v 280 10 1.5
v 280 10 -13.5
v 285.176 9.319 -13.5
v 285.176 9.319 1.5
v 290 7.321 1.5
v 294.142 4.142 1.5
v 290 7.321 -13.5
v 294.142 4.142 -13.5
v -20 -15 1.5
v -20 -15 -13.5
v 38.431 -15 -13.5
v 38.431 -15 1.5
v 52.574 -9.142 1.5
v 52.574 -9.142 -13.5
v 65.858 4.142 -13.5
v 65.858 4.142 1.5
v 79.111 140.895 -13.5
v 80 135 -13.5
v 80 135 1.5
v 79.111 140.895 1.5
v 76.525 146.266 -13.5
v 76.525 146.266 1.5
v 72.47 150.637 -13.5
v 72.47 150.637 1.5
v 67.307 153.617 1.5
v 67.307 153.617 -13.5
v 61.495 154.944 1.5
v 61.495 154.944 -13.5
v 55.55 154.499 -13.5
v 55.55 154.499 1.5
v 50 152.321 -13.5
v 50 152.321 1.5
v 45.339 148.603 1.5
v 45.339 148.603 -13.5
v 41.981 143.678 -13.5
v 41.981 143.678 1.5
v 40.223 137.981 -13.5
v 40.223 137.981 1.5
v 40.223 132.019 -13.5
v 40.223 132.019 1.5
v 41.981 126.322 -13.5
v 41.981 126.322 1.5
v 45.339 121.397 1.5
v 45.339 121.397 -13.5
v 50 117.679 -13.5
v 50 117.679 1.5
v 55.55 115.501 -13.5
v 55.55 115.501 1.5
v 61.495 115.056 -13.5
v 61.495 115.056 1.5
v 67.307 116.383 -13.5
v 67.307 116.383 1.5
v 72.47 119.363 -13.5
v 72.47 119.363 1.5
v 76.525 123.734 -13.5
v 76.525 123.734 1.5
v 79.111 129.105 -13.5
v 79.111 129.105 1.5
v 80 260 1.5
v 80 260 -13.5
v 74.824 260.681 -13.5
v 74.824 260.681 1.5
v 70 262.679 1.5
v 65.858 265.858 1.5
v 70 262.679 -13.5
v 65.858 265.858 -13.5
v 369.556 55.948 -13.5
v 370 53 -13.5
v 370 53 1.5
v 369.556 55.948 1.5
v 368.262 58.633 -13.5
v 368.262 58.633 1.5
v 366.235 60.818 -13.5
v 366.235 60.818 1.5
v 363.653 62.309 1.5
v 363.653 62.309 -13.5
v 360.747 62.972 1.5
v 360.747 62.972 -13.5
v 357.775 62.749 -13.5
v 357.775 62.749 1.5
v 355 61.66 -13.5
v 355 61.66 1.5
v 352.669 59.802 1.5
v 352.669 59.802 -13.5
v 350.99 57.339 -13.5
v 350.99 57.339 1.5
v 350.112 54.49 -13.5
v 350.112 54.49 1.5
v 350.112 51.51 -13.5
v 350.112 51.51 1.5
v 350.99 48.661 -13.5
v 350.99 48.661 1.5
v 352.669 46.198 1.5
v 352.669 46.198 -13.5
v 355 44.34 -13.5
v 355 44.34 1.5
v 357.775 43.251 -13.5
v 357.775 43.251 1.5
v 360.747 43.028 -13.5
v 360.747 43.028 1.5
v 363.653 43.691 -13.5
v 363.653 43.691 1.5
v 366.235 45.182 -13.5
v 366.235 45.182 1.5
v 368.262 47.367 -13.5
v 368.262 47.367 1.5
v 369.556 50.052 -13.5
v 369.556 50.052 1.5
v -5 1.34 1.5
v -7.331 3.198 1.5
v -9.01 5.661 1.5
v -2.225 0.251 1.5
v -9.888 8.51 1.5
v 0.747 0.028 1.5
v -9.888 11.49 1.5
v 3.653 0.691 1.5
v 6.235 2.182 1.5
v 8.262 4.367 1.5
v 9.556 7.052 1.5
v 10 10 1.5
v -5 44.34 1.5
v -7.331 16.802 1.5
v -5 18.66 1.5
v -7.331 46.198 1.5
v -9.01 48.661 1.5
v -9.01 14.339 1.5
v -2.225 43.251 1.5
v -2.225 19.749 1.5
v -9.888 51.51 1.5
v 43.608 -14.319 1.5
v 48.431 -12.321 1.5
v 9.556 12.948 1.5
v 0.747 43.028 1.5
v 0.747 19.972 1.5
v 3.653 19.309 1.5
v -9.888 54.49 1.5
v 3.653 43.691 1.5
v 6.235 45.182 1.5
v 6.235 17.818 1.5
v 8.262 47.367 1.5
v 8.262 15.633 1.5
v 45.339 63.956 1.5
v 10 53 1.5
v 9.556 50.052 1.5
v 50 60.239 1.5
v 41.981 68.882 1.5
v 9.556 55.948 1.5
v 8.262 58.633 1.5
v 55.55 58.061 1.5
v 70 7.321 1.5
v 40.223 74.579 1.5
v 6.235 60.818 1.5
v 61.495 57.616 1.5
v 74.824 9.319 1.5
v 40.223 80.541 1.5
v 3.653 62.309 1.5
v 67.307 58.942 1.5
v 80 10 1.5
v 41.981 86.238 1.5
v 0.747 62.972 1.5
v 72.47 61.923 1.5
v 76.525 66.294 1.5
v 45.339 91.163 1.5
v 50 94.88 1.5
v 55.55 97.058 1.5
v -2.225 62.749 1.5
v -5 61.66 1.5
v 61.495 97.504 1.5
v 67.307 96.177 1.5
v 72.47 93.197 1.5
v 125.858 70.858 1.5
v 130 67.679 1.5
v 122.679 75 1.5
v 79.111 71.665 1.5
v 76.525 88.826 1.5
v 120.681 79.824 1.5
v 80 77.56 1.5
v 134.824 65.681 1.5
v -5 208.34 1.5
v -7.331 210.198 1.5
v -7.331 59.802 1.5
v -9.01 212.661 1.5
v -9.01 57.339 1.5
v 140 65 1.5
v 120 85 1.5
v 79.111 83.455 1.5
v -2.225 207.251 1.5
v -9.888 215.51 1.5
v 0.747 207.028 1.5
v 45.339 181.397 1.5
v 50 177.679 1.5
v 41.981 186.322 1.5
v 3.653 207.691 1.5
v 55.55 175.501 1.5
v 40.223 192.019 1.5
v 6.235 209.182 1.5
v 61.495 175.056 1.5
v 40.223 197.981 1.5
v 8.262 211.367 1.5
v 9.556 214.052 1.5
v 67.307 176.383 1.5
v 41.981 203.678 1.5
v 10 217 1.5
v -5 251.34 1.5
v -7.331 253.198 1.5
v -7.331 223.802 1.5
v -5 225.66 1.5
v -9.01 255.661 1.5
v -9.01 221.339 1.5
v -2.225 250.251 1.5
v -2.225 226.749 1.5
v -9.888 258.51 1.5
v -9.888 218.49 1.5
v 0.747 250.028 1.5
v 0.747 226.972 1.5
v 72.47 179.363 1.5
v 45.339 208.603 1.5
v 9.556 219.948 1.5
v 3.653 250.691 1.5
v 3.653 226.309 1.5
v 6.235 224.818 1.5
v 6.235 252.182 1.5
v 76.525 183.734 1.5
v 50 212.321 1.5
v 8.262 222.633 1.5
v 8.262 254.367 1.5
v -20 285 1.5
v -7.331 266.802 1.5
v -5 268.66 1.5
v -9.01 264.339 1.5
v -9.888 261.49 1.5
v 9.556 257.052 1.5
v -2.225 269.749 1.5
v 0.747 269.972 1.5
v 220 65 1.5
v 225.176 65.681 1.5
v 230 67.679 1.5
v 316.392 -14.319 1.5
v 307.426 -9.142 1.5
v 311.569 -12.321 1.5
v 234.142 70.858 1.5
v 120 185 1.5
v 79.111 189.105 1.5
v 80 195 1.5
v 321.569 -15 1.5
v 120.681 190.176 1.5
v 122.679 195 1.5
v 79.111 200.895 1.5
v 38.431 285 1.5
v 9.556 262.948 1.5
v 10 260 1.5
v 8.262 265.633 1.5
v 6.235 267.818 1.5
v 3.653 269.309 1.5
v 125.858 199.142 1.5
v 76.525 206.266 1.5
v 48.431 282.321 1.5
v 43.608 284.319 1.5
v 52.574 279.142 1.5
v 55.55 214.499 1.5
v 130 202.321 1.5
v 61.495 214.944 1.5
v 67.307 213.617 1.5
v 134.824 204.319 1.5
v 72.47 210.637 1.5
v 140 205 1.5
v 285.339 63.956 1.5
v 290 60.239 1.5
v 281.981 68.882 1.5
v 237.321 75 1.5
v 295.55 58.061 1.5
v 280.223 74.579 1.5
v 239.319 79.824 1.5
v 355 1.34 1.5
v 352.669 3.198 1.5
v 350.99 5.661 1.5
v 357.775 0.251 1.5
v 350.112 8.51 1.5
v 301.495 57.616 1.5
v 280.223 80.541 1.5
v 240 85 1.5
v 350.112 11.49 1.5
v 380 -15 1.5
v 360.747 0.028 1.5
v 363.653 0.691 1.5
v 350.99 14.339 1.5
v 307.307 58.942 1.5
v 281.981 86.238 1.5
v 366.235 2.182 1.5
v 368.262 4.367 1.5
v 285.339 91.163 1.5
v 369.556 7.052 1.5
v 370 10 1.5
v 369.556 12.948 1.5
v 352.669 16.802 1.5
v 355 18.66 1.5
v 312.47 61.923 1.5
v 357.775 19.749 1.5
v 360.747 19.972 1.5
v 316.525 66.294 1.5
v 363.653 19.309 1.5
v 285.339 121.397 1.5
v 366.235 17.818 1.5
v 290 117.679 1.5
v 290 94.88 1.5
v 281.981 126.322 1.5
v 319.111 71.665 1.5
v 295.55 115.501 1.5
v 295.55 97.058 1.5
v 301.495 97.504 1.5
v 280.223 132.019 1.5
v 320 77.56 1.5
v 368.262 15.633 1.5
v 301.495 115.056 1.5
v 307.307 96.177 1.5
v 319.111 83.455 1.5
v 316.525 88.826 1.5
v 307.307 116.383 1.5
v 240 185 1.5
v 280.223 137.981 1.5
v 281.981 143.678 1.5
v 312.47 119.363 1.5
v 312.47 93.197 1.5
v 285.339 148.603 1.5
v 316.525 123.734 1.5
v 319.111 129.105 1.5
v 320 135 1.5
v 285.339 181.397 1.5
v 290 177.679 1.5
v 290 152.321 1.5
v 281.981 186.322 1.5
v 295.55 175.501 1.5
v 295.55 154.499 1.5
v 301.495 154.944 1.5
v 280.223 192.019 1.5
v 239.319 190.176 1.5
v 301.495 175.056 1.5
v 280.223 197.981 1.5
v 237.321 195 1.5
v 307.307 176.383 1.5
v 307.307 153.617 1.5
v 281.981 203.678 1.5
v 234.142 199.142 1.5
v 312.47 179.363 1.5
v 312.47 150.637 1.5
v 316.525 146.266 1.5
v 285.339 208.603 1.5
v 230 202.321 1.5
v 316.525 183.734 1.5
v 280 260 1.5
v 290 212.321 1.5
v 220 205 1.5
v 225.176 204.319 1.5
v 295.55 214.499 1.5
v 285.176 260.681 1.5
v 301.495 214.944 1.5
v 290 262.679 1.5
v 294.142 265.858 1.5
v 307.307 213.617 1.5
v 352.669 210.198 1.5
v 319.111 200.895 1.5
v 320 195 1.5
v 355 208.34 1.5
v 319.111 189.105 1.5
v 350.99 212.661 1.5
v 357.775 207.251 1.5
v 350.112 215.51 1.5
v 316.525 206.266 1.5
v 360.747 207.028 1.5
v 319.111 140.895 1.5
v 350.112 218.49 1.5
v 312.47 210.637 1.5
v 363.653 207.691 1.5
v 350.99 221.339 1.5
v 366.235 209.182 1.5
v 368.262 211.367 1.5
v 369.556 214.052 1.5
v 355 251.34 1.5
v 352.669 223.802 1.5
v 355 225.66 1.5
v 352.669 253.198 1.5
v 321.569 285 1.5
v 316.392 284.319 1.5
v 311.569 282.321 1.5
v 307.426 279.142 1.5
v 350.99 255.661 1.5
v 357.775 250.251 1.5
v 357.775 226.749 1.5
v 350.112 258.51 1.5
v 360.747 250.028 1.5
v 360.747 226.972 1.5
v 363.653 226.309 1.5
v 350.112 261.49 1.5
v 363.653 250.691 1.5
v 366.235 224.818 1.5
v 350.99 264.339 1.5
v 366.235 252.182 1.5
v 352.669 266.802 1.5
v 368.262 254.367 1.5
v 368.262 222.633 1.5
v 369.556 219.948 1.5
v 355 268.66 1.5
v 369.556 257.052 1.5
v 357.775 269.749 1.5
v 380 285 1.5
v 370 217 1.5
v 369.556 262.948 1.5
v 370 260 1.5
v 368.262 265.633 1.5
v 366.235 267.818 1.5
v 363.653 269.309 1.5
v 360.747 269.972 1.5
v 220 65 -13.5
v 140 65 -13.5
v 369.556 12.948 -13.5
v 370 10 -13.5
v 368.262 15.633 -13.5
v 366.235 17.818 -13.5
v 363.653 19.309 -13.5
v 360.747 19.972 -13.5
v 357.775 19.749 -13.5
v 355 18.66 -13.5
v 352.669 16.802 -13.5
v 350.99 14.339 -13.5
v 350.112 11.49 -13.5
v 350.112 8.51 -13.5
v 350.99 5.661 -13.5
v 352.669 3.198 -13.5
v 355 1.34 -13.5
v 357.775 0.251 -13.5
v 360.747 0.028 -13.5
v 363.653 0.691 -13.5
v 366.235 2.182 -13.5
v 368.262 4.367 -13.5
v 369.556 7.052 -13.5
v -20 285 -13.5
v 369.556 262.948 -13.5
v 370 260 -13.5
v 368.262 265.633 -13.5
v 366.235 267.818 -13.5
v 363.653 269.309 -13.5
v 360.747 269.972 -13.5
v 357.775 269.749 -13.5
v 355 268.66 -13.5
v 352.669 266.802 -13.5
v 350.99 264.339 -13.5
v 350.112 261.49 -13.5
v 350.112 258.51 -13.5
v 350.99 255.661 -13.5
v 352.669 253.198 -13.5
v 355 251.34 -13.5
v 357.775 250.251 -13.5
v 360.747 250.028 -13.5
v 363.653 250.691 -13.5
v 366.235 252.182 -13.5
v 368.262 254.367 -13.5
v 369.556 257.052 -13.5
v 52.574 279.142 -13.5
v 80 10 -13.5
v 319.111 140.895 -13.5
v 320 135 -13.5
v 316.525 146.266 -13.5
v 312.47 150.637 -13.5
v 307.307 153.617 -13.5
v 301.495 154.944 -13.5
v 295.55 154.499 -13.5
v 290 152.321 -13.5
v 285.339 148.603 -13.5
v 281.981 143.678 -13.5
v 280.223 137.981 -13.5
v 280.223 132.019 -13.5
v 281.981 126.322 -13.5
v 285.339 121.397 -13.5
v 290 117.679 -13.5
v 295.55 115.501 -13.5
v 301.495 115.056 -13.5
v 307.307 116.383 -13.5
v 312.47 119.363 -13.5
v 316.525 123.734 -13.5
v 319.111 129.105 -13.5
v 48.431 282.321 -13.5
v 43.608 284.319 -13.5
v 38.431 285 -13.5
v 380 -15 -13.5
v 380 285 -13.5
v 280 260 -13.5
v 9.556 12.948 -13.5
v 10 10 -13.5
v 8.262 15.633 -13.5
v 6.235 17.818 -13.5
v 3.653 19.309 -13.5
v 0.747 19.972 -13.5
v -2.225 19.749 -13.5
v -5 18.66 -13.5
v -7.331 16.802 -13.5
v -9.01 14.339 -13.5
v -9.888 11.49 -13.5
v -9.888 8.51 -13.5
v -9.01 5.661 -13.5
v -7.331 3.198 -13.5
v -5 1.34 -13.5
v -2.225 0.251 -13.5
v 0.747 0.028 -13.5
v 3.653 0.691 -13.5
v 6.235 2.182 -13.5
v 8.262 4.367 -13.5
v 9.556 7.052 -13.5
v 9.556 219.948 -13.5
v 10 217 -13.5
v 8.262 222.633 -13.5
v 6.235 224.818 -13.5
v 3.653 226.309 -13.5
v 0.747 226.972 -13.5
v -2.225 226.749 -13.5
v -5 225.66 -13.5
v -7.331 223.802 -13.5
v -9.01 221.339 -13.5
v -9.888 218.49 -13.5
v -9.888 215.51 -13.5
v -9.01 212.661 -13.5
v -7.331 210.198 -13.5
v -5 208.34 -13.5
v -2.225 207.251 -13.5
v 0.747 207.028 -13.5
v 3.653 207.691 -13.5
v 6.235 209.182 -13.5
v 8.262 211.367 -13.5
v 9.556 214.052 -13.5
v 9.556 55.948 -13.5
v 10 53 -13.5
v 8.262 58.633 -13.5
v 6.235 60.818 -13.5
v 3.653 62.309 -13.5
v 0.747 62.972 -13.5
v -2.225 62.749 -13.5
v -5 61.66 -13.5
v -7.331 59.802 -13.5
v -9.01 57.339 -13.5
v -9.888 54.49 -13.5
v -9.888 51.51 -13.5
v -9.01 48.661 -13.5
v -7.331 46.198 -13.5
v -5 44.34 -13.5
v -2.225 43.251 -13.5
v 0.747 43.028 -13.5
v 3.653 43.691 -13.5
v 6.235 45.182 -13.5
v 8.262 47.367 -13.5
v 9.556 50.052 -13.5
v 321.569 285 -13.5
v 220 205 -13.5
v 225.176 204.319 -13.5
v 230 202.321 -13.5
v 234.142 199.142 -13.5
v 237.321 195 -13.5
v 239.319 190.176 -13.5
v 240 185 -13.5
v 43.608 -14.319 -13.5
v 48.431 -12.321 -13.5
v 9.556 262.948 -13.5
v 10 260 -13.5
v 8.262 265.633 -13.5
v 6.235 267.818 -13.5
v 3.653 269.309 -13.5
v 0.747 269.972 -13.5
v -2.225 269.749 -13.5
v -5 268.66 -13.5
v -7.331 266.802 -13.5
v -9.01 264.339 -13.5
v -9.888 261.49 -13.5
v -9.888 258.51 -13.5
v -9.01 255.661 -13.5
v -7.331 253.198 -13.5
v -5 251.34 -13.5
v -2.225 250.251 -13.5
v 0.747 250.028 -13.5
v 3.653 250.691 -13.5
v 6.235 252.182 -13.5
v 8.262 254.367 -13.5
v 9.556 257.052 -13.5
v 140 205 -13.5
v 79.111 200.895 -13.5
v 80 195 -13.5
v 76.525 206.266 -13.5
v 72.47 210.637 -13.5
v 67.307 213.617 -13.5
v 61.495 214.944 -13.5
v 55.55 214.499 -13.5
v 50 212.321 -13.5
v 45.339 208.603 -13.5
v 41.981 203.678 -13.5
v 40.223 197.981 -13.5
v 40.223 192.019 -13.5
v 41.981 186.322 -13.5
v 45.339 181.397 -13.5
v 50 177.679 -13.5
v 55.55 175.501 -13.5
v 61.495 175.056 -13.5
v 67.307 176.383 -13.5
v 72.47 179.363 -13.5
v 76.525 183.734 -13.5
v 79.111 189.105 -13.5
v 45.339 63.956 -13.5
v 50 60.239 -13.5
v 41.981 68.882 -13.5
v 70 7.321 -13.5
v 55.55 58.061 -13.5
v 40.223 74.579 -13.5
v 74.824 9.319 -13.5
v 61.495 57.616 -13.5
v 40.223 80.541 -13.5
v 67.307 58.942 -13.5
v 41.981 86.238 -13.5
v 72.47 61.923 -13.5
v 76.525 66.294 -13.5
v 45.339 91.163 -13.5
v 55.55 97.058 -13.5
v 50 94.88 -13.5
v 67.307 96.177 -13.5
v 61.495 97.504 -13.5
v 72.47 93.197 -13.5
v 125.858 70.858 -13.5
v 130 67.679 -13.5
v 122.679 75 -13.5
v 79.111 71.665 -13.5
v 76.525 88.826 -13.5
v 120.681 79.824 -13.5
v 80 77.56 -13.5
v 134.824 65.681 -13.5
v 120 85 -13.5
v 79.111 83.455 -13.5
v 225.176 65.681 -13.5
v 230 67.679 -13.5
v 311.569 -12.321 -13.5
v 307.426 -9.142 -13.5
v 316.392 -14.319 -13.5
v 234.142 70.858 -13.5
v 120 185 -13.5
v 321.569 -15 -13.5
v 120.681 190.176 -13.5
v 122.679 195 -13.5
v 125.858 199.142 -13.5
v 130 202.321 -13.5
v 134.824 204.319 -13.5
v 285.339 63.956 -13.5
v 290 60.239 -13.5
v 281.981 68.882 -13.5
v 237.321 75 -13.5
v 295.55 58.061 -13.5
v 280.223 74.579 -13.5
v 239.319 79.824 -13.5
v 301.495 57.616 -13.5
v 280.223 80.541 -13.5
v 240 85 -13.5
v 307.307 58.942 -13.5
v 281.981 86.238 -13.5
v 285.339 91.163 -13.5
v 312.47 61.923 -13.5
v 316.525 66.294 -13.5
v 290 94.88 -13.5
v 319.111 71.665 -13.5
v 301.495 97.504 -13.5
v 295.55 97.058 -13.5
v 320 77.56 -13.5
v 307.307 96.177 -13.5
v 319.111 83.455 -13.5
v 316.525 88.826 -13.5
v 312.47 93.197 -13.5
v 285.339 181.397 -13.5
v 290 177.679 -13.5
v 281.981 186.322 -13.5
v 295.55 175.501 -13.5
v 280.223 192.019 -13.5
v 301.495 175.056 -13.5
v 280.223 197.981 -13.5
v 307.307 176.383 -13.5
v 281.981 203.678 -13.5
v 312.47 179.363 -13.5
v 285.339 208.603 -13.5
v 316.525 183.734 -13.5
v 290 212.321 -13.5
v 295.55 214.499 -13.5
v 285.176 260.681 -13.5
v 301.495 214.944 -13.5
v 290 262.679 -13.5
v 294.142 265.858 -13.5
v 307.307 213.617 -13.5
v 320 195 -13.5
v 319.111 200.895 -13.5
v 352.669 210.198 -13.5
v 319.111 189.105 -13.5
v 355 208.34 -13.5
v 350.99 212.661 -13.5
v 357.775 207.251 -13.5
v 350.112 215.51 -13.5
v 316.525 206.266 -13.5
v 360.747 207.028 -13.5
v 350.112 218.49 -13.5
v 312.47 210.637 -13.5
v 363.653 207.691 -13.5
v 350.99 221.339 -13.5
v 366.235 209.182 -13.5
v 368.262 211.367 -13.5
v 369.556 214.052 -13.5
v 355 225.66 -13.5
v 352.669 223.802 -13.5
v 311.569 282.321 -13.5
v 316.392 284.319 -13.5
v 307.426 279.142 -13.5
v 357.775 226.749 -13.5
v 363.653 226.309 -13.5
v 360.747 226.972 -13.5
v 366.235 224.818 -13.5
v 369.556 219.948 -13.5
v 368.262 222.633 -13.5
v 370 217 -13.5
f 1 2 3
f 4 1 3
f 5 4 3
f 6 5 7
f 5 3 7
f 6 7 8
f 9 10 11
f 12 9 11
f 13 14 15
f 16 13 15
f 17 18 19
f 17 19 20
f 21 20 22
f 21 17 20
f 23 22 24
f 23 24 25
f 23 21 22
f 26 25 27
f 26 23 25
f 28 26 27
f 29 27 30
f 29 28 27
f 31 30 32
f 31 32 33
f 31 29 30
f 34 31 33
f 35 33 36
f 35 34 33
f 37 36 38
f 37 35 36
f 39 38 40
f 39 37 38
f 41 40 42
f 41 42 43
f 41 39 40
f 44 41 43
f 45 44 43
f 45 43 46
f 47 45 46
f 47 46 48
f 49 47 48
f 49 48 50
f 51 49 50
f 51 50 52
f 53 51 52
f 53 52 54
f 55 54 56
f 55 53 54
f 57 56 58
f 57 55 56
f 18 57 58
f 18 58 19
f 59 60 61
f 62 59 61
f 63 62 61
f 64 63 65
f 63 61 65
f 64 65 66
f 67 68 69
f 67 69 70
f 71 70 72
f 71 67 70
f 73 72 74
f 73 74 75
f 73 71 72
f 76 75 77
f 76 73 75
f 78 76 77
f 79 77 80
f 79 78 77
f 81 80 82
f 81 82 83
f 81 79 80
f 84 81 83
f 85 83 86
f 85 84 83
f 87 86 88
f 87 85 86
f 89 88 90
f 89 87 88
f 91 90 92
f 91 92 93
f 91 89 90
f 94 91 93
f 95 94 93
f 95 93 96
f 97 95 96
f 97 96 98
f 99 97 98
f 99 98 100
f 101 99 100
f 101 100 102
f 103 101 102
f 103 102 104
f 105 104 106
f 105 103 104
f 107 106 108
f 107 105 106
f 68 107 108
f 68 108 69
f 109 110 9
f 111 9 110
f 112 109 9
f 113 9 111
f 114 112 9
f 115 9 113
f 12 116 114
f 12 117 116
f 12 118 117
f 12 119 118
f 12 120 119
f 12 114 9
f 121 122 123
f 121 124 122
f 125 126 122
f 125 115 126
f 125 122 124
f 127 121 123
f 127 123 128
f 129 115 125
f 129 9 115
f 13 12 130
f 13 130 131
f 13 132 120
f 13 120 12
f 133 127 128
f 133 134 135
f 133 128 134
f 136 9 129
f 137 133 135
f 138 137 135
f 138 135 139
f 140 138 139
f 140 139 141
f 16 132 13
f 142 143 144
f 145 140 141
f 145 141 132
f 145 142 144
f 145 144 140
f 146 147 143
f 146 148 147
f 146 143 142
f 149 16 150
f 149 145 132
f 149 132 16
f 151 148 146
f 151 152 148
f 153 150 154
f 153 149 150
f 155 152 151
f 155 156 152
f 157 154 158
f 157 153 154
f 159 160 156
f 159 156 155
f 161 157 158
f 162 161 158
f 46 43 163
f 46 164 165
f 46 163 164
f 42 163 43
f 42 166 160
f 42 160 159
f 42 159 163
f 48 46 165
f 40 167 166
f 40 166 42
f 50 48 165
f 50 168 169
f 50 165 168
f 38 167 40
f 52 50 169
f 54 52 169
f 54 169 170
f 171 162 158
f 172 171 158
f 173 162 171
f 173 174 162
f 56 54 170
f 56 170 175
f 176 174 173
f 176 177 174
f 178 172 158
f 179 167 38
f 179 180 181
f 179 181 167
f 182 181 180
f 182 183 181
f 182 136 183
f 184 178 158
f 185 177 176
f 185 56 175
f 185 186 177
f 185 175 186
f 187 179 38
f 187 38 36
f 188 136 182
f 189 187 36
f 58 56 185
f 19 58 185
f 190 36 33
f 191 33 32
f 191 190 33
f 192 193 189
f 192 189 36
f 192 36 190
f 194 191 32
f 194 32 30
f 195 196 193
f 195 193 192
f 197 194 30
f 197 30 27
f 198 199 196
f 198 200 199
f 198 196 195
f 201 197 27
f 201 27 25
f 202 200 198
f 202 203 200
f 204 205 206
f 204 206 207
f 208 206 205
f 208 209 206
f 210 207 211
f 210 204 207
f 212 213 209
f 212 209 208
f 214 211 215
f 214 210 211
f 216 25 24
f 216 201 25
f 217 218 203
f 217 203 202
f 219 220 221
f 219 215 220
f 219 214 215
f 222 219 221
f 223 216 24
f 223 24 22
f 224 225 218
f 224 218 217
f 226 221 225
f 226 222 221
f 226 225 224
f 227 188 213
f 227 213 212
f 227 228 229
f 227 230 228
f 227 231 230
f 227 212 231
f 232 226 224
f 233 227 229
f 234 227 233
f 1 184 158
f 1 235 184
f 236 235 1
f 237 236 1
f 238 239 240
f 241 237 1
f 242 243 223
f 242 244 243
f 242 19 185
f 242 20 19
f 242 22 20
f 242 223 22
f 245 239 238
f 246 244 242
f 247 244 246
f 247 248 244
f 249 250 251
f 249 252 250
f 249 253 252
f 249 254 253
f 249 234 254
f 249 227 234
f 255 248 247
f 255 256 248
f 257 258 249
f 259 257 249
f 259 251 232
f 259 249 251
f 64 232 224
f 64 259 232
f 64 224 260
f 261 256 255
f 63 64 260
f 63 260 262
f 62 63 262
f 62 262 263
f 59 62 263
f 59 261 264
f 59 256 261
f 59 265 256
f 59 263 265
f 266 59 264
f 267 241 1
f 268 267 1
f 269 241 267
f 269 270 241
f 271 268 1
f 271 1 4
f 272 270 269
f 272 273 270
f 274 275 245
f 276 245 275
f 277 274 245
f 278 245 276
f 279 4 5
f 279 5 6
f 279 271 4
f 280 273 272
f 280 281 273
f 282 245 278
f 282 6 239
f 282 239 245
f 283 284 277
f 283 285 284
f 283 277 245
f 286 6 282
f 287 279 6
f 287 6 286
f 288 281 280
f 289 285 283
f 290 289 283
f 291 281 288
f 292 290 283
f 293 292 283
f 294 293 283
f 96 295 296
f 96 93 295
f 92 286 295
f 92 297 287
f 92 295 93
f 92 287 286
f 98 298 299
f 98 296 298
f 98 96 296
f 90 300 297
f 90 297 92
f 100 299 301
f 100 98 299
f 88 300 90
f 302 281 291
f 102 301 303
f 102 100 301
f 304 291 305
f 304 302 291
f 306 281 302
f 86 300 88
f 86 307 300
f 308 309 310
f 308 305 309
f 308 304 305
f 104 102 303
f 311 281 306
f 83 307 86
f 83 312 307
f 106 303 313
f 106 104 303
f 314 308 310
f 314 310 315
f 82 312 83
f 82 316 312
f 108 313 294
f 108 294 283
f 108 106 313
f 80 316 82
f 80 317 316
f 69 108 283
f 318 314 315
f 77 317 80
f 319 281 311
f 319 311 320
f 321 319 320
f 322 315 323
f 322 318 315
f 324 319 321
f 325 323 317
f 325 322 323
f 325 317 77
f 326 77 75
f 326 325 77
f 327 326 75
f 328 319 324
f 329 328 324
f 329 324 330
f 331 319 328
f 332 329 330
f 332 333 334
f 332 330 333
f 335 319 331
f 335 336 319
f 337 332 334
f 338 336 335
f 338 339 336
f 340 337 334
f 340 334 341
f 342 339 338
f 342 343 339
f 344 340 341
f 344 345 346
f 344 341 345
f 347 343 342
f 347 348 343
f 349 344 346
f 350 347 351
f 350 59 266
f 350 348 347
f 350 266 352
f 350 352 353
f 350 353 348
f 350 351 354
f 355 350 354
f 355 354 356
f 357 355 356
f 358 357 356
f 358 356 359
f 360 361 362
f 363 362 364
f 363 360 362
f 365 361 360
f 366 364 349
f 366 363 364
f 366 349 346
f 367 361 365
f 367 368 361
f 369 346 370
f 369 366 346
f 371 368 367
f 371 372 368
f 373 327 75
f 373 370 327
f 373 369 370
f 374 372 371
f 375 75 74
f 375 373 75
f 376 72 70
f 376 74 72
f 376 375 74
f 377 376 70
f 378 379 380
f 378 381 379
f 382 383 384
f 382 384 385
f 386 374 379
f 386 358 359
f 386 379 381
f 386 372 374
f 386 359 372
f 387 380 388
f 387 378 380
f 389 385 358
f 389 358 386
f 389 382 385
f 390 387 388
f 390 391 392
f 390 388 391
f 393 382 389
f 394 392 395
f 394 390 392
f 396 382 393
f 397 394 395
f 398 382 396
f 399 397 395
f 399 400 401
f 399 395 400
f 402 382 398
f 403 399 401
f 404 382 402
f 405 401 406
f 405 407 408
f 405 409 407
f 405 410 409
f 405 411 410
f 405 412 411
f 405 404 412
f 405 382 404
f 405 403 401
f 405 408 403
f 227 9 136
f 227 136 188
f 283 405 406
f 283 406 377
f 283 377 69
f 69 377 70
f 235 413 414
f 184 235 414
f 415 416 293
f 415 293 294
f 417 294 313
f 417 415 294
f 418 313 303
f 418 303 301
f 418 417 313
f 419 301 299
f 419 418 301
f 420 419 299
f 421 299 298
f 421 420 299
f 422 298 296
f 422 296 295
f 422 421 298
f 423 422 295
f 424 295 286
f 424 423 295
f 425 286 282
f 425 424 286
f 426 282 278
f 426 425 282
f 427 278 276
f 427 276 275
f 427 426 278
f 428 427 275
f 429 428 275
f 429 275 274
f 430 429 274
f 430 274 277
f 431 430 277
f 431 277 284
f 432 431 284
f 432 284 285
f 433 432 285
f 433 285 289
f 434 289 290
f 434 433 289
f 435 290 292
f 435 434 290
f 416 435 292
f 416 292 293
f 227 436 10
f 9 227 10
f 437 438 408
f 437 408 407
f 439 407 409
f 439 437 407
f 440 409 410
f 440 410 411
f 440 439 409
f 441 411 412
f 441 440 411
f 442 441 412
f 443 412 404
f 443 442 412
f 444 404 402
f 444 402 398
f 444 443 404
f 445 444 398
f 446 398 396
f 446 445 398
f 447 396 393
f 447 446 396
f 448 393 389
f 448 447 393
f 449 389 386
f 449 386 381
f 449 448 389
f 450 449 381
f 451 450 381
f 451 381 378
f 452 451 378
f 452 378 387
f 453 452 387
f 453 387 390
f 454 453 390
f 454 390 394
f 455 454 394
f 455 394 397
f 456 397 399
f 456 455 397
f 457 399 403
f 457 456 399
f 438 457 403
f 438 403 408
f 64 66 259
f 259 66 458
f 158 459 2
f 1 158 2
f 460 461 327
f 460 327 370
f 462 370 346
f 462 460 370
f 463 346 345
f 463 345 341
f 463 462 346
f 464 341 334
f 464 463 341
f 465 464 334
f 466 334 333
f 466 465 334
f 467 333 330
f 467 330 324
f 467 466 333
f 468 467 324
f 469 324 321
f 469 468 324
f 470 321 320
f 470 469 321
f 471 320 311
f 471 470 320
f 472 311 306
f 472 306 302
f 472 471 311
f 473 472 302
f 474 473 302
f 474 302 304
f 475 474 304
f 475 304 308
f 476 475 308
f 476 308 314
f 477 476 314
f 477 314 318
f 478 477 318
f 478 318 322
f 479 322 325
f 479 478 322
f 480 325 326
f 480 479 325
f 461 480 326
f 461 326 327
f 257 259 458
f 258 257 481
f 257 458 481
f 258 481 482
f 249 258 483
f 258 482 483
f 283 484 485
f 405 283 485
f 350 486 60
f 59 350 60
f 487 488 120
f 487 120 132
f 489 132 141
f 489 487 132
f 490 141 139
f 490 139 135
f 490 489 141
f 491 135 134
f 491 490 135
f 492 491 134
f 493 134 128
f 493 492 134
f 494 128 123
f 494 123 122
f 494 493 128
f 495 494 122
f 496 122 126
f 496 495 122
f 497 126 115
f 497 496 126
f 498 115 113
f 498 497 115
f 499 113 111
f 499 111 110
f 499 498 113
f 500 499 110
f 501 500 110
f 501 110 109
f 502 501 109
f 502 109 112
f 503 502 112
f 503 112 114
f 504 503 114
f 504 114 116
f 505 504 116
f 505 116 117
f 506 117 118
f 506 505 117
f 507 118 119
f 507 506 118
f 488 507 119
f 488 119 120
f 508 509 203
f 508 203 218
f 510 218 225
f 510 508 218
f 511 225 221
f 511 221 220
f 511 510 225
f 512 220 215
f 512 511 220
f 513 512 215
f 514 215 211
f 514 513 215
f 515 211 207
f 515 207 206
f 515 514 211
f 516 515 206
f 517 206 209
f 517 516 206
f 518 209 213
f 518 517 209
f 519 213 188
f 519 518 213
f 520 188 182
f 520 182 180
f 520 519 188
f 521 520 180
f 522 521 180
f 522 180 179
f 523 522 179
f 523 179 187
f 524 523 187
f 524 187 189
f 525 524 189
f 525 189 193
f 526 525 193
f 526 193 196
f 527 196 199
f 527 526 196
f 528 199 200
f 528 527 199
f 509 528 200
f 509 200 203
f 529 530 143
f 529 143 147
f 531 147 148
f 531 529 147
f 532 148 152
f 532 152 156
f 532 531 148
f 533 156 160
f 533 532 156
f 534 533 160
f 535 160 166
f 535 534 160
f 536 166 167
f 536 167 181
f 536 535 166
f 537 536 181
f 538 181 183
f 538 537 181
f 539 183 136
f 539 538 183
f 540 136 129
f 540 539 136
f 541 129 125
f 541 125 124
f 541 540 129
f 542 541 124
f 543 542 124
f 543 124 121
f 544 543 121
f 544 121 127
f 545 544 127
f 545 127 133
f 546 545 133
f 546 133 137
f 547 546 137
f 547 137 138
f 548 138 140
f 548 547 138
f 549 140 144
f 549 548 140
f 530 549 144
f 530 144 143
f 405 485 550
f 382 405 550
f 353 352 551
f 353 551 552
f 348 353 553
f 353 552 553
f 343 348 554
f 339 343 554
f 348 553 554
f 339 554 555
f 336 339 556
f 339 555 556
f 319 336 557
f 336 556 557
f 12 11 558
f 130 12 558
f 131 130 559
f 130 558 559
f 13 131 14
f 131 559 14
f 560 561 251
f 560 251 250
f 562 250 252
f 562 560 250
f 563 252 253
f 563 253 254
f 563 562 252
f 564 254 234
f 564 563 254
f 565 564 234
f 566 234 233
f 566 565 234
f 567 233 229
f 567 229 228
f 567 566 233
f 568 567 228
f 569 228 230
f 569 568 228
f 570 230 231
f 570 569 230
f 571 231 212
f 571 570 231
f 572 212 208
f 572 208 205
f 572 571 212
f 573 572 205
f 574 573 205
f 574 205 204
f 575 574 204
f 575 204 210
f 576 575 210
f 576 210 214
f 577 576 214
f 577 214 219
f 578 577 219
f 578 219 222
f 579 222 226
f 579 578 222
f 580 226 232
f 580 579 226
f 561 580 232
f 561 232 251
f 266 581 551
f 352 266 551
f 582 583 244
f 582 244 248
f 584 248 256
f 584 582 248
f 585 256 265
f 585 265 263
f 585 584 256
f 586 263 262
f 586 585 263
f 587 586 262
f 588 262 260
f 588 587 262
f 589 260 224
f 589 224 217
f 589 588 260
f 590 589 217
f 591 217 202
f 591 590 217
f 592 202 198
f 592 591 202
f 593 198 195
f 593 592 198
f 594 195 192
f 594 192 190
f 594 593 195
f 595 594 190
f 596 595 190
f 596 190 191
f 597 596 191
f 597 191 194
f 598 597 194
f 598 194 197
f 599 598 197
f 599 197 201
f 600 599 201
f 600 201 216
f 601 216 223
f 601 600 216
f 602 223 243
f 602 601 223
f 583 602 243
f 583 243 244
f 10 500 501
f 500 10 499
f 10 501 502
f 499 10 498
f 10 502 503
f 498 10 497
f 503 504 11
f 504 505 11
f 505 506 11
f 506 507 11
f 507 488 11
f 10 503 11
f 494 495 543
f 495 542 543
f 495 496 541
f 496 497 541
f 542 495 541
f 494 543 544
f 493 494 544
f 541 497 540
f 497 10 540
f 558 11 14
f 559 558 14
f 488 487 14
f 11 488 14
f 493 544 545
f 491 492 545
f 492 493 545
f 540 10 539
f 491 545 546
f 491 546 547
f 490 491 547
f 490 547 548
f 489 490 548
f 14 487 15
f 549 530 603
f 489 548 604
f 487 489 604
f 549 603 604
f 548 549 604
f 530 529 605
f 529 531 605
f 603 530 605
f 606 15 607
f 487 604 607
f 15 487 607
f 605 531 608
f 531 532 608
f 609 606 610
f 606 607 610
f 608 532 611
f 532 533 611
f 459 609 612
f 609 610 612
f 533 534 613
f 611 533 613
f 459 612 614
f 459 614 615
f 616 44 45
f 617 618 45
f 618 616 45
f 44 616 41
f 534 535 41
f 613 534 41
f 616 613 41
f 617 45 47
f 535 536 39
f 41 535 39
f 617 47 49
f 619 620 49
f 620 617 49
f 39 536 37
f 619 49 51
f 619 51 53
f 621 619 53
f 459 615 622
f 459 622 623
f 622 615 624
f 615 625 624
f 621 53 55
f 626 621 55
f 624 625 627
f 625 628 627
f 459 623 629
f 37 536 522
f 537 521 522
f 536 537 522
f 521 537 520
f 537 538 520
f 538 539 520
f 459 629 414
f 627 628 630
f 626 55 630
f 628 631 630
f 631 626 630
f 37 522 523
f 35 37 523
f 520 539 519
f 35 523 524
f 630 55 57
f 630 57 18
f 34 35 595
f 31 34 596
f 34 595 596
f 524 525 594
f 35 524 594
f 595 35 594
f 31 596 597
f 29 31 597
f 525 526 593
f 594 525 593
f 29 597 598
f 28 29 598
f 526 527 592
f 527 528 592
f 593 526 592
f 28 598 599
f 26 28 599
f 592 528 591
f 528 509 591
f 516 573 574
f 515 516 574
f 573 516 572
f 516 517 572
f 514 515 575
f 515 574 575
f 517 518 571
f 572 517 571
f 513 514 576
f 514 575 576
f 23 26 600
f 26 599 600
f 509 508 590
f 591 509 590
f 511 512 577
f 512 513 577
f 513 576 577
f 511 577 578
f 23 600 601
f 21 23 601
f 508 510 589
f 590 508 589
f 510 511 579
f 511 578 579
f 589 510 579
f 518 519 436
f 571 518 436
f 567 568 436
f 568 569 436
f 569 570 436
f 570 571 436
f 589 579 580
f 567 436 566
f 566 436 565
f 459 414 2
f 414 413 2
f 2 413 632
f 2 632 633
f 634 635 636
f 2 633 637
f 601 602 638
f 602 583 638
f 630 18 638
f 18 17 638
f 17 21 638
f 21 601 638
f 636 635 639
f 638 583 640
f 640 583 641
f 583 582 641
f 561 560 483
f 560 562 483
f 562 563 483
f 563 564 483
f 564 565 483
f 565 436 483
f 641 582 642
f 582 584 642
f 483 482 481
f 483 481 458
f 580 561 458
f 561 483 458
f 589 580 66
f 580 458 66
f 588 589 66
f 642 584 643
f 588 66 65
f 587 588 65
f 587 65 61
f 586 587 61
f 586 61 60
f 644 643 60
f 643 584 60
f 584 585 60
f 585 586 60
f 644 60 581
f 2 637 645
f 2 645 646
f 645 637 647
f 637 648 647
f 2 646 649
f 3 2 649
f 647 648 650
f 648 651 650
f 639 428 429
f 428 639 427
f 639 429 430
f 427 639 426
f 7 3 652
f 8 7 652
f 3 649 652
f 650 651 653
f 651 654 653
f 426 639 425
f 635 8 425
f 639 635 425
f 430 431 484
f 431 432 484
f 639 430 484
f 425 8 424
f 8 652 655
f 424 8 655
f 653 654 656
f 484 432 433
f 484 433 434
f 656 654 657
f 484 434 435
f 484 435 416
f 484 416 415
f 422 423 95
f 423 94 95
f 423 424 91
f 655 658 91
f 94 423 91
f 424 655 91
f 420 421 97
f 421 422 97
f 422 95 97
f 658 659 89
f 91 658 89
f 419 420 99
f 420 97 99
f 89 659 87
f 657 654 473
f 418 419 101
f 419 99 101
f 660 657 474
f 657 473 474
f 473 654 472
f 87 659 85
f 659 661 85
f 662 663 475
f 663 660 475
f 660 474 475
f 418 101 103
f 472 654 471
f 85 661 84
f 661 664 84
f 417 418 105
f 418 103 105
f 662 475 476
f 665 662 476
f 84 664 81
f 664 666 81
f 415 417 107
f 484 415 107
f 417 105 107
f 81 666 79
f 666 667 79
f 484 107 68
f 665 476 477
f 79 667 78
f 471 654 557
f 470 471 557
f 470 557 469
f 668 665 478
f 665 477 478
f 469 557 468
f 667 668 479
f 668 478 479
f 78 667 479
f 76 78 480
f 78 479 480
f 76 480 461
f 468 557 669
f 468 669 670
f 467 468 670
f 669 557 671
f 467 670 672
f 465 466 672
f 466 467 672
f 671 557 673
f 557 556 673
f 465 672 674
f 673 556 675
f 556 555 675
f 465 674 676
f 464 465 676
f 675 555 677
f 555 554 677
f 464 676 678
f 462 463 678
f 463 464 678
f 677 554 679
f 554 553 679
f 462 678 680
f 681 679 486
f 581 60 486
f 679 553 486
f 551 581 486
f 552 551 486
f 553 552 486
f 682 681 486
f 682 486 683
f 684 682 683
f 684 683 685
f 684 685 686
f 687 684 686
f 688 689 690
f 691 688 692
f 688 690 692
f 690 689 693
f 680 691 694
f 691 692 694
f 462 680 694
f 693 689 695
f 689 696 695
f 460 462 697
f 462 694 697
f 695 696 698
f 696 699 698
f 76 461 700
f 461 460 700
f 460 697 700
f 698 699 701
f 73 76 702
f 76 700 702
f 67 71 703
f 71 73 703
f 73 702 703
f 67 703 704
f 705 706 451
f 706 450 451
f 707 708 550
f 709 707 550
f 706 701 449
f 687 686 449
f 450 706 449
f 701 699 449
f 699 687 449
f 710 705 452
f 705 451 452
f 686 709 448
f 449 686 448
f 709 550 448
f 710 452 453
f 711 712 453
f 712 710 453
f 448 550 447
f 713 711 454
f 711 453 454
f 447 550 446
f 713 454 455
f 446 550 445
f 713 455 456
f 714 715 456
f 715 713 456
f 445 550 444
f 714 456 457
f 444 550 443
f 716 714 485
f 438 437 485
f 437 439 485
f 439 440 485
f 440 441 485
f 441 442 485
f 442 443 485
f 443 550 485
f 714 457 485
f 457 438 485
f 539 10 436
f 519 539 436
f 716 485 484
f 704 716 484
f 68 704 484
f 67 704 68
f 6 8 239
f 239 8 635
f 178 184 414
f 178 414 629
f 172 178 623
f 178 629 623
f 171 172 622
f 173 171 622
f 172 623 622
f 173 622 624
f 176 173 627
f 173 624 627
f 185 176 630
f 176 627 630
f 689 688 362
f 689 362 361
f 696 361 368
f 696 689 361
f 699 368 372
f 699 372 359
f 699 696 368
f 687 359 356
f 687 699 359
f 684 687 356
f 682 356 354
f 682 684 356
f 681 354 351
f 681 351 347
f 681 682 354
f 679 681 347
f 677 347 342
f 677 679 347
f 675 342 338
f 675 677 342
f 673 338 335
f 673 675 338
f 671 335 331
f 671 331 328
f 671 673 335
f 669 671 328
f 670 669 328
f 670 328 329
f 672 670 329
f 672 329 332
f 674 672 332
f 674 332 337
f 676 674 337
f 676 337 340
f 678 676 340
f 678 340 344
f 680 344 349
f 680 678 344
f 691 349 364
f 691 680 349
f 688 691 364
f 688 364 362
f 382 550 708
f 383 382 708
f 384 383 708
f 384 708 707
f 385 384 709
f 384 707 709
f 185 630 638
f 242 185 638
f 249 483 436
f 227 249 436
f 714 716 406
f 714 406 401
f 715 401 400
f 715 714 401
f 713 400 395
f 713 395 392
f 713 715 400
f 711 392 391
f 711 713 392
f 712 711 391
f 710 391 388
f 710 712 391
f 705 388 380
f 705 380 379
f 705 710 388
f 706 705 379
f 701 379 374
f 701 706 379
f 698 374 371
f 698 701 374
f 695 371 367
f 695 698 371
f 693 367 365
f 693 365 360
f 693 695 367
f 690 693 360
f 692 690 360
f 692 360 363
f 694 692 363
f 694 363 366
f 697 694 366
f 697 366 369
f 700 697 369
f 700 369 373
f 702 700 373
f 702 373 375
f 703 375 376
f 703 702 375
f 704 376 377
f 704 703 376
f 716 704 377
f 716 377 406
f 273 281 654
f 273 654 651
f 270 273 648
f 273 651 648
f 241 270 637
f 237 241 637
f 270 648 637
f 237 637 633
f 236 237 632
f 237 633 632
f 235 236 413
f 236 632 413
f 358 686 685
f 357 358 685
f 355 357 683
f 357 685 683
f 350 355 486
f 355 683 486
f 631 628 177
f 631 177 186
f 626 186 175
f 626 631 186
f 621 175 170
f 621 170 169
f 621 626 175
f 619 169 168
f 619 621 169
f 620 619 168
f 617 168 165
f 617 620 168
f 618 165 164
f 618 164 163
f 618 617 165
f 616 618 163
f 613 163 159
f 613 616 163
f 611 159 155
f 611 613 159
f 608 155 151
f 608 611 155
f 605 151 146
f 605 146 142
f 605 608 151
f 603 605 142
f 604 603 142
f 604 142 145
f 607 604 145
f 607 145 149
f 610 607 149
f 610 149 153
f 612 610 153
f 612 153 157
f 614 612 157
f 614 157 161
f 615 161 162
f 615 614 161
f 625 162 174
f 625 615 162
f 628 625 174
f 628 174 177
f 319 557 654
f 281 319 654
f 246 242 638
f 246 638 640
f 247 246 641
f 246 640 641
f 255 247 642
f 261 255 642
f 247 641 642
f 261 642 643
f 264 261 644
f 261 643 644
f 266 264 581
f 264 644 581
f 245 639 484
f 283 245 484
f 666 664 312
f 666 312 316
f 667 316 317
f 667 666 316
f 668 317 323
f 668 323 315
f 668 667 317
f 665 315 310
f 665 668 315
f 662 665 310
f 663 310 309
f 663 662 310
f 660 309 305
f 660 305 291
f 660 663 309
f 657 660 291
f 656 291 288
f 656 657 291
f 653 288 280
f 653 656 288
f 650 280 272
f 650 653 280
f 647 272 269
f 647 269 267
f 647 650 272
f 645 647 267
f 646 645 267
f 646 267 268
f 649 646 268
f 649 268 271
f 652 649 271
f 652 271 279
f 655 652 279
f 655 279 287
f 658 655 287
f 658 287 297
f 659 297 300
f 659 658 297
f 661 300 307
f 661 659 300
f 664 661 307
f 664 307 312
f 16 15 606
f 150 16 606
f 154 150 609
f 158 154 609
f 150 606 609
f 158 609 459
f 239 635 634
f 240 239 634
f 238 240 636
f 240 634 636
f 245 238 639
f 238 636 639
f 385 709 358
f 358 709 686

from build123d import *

# Parameters (mm, degrees)
F0_R     = 1
F0_R_2   = 2
F1_DEPTH = 1.5
F2_SCALE = 10


# Not quite as in the source:
# - ends of sketch curves that miss each other by under 0.0002 mm in the source are joined


with BuildPart() as f1:
    # F0 (on Top) → F1 (new body)
    with BuildSketch(Plane.XY):
        with BuildLine():
            ThreePointArc((14.156854, 15), (13.3914871353, 14.847759065), (12.7426404376, 14.4142135624))
            Line((12.7426404376, 14.4142135624), (11.414213, 13.085786))
            ThreePointArc((11.414213, 13.085786), (10.7653665381, 12.6522407997), (10, 12.5))
            Line((10, 12.5), (-10, 12.5))
            ThreePointArc((-10, 12.5), (-10.7653668647, 12.652240935), (-11.4142135624, 13.0857864376))
            Line((-11.4142135624, 13.0857864376), (-12.742641, 14.414213))
            ThreePointArc((-12.742641, 14.414213), (-13.3914871353, 14.847759065), (-14.156854, 15))
            Line((-14.156854, 15), (-20, 15))
            Line((-20, 15), (-20, -15))
            Line((-20, -15), (-14.156854, -15))
            ThreePointArc((-14.156854, -15), (-13.3914874619, -14.8477592003), (-12.7426409376, -14.4142140624))
            Line((-12.7426409376, -14.4142140624), (-11.414214, -13.085787))
            ThreePointArc((-11.414214, -13.085787), (-10.7653671914, -12.6522410703), (-10, -12.5))
            Line((-10, -12.5), (10, -12.5))
            ThreePointArc((10, -12.5), (10.7653668647, -12.652240935), (11.4142135624, -13.0857864376))
            Line((11.4142135624, -13.0857864376), (12.742641, -14.414214))
            ThreePointArc((12.742641, -14.414214), (13.3914874619, -14.8477592003), (14.156854, -15))
            Line((14.156854, -15), (20, -15))
            Line((20, -15), (20, 15))
            Line((20, 15), (14.156854, 15))
        make_face()
        with Locations((-18, -12.5)):
            Circle(F0_R, mode=Mode.SUBTRACT)
        with Locations((-18, -8.2)):
            Circle(F0_R, mode=Mode.SUBTRACT)
        with Locations((-12, -5.744006)):
            Circle(F0_R_2, mode=Mode.SUBTRACT)
        with Locations((18, -12.5)):
            Circle(F0_R, mode=Mode.SUBTRACT)
        with Locations((18, -8.2)):
            Circle(F0_R, mode=Mode.SUBTRACT)
        with Locations((12, -5.744006)):
            Circle(F0_R_2, mode=Mode.SUBTRACT)
        with Locations((-12, 0)):
            Circle(F0_R_2, mode=Mode.SUBTRACT)
        with Locations((-12, 6)):
            Circle(F0_R_2, mode=Mode.SUBTRACT)
        with Locations((-18, 8.2)):
            Circle(F0_R, mode=Mode.SUBTRACT)
        with Locations((-18, 12.5)):
            Circle(F0_R, mode=Mode.SUBTRACT)
        with BuildLine():
            ThreePointArc((-6, 5), (-5.4142135624, 6.4142135624), (-4, 7))
            Line((-4, 7), (4, 7))
            ThreePointArc((4, 7), (5.4142135624, 6.4142135624), (6, 5))
            Line((6, 5), (6, -5))
            ThreePointArc((6, -5), (5.4142135624, -6.4142135624), (4, -7))
            Line((4, -7), (-4, -7))
            ThreePointArc((-4, -7), (-5.4142135624, -6.4142135624), (-6, -5))
            Line((-6, -5), (-6, 5))
        make_face(mode=Mode.SUBTRACT)
        with Locations((12, 0)):
            Circle(F0_R_2, mode=Mode.SUBTRACT)
        with Locations((12, 6)):
            Circle(F0_R_2, mode=Mode.SUBTRACT)
        with Locations((18, 8.2)):
            Circle(F0_R, mode=Mode.SUBTRACT)
        with Locations((18, 12.5)):
            Circle(F0_R, mode=Mode.SUBTRACT)
    extrude(amount=F1_DEPTH)


with BuildPart() as f1_1:
    # F2: moved
    add(f1.part.scale(F2_SCALE).moved(Location((180, 135, -13.5))))


solid = f1_1.part
